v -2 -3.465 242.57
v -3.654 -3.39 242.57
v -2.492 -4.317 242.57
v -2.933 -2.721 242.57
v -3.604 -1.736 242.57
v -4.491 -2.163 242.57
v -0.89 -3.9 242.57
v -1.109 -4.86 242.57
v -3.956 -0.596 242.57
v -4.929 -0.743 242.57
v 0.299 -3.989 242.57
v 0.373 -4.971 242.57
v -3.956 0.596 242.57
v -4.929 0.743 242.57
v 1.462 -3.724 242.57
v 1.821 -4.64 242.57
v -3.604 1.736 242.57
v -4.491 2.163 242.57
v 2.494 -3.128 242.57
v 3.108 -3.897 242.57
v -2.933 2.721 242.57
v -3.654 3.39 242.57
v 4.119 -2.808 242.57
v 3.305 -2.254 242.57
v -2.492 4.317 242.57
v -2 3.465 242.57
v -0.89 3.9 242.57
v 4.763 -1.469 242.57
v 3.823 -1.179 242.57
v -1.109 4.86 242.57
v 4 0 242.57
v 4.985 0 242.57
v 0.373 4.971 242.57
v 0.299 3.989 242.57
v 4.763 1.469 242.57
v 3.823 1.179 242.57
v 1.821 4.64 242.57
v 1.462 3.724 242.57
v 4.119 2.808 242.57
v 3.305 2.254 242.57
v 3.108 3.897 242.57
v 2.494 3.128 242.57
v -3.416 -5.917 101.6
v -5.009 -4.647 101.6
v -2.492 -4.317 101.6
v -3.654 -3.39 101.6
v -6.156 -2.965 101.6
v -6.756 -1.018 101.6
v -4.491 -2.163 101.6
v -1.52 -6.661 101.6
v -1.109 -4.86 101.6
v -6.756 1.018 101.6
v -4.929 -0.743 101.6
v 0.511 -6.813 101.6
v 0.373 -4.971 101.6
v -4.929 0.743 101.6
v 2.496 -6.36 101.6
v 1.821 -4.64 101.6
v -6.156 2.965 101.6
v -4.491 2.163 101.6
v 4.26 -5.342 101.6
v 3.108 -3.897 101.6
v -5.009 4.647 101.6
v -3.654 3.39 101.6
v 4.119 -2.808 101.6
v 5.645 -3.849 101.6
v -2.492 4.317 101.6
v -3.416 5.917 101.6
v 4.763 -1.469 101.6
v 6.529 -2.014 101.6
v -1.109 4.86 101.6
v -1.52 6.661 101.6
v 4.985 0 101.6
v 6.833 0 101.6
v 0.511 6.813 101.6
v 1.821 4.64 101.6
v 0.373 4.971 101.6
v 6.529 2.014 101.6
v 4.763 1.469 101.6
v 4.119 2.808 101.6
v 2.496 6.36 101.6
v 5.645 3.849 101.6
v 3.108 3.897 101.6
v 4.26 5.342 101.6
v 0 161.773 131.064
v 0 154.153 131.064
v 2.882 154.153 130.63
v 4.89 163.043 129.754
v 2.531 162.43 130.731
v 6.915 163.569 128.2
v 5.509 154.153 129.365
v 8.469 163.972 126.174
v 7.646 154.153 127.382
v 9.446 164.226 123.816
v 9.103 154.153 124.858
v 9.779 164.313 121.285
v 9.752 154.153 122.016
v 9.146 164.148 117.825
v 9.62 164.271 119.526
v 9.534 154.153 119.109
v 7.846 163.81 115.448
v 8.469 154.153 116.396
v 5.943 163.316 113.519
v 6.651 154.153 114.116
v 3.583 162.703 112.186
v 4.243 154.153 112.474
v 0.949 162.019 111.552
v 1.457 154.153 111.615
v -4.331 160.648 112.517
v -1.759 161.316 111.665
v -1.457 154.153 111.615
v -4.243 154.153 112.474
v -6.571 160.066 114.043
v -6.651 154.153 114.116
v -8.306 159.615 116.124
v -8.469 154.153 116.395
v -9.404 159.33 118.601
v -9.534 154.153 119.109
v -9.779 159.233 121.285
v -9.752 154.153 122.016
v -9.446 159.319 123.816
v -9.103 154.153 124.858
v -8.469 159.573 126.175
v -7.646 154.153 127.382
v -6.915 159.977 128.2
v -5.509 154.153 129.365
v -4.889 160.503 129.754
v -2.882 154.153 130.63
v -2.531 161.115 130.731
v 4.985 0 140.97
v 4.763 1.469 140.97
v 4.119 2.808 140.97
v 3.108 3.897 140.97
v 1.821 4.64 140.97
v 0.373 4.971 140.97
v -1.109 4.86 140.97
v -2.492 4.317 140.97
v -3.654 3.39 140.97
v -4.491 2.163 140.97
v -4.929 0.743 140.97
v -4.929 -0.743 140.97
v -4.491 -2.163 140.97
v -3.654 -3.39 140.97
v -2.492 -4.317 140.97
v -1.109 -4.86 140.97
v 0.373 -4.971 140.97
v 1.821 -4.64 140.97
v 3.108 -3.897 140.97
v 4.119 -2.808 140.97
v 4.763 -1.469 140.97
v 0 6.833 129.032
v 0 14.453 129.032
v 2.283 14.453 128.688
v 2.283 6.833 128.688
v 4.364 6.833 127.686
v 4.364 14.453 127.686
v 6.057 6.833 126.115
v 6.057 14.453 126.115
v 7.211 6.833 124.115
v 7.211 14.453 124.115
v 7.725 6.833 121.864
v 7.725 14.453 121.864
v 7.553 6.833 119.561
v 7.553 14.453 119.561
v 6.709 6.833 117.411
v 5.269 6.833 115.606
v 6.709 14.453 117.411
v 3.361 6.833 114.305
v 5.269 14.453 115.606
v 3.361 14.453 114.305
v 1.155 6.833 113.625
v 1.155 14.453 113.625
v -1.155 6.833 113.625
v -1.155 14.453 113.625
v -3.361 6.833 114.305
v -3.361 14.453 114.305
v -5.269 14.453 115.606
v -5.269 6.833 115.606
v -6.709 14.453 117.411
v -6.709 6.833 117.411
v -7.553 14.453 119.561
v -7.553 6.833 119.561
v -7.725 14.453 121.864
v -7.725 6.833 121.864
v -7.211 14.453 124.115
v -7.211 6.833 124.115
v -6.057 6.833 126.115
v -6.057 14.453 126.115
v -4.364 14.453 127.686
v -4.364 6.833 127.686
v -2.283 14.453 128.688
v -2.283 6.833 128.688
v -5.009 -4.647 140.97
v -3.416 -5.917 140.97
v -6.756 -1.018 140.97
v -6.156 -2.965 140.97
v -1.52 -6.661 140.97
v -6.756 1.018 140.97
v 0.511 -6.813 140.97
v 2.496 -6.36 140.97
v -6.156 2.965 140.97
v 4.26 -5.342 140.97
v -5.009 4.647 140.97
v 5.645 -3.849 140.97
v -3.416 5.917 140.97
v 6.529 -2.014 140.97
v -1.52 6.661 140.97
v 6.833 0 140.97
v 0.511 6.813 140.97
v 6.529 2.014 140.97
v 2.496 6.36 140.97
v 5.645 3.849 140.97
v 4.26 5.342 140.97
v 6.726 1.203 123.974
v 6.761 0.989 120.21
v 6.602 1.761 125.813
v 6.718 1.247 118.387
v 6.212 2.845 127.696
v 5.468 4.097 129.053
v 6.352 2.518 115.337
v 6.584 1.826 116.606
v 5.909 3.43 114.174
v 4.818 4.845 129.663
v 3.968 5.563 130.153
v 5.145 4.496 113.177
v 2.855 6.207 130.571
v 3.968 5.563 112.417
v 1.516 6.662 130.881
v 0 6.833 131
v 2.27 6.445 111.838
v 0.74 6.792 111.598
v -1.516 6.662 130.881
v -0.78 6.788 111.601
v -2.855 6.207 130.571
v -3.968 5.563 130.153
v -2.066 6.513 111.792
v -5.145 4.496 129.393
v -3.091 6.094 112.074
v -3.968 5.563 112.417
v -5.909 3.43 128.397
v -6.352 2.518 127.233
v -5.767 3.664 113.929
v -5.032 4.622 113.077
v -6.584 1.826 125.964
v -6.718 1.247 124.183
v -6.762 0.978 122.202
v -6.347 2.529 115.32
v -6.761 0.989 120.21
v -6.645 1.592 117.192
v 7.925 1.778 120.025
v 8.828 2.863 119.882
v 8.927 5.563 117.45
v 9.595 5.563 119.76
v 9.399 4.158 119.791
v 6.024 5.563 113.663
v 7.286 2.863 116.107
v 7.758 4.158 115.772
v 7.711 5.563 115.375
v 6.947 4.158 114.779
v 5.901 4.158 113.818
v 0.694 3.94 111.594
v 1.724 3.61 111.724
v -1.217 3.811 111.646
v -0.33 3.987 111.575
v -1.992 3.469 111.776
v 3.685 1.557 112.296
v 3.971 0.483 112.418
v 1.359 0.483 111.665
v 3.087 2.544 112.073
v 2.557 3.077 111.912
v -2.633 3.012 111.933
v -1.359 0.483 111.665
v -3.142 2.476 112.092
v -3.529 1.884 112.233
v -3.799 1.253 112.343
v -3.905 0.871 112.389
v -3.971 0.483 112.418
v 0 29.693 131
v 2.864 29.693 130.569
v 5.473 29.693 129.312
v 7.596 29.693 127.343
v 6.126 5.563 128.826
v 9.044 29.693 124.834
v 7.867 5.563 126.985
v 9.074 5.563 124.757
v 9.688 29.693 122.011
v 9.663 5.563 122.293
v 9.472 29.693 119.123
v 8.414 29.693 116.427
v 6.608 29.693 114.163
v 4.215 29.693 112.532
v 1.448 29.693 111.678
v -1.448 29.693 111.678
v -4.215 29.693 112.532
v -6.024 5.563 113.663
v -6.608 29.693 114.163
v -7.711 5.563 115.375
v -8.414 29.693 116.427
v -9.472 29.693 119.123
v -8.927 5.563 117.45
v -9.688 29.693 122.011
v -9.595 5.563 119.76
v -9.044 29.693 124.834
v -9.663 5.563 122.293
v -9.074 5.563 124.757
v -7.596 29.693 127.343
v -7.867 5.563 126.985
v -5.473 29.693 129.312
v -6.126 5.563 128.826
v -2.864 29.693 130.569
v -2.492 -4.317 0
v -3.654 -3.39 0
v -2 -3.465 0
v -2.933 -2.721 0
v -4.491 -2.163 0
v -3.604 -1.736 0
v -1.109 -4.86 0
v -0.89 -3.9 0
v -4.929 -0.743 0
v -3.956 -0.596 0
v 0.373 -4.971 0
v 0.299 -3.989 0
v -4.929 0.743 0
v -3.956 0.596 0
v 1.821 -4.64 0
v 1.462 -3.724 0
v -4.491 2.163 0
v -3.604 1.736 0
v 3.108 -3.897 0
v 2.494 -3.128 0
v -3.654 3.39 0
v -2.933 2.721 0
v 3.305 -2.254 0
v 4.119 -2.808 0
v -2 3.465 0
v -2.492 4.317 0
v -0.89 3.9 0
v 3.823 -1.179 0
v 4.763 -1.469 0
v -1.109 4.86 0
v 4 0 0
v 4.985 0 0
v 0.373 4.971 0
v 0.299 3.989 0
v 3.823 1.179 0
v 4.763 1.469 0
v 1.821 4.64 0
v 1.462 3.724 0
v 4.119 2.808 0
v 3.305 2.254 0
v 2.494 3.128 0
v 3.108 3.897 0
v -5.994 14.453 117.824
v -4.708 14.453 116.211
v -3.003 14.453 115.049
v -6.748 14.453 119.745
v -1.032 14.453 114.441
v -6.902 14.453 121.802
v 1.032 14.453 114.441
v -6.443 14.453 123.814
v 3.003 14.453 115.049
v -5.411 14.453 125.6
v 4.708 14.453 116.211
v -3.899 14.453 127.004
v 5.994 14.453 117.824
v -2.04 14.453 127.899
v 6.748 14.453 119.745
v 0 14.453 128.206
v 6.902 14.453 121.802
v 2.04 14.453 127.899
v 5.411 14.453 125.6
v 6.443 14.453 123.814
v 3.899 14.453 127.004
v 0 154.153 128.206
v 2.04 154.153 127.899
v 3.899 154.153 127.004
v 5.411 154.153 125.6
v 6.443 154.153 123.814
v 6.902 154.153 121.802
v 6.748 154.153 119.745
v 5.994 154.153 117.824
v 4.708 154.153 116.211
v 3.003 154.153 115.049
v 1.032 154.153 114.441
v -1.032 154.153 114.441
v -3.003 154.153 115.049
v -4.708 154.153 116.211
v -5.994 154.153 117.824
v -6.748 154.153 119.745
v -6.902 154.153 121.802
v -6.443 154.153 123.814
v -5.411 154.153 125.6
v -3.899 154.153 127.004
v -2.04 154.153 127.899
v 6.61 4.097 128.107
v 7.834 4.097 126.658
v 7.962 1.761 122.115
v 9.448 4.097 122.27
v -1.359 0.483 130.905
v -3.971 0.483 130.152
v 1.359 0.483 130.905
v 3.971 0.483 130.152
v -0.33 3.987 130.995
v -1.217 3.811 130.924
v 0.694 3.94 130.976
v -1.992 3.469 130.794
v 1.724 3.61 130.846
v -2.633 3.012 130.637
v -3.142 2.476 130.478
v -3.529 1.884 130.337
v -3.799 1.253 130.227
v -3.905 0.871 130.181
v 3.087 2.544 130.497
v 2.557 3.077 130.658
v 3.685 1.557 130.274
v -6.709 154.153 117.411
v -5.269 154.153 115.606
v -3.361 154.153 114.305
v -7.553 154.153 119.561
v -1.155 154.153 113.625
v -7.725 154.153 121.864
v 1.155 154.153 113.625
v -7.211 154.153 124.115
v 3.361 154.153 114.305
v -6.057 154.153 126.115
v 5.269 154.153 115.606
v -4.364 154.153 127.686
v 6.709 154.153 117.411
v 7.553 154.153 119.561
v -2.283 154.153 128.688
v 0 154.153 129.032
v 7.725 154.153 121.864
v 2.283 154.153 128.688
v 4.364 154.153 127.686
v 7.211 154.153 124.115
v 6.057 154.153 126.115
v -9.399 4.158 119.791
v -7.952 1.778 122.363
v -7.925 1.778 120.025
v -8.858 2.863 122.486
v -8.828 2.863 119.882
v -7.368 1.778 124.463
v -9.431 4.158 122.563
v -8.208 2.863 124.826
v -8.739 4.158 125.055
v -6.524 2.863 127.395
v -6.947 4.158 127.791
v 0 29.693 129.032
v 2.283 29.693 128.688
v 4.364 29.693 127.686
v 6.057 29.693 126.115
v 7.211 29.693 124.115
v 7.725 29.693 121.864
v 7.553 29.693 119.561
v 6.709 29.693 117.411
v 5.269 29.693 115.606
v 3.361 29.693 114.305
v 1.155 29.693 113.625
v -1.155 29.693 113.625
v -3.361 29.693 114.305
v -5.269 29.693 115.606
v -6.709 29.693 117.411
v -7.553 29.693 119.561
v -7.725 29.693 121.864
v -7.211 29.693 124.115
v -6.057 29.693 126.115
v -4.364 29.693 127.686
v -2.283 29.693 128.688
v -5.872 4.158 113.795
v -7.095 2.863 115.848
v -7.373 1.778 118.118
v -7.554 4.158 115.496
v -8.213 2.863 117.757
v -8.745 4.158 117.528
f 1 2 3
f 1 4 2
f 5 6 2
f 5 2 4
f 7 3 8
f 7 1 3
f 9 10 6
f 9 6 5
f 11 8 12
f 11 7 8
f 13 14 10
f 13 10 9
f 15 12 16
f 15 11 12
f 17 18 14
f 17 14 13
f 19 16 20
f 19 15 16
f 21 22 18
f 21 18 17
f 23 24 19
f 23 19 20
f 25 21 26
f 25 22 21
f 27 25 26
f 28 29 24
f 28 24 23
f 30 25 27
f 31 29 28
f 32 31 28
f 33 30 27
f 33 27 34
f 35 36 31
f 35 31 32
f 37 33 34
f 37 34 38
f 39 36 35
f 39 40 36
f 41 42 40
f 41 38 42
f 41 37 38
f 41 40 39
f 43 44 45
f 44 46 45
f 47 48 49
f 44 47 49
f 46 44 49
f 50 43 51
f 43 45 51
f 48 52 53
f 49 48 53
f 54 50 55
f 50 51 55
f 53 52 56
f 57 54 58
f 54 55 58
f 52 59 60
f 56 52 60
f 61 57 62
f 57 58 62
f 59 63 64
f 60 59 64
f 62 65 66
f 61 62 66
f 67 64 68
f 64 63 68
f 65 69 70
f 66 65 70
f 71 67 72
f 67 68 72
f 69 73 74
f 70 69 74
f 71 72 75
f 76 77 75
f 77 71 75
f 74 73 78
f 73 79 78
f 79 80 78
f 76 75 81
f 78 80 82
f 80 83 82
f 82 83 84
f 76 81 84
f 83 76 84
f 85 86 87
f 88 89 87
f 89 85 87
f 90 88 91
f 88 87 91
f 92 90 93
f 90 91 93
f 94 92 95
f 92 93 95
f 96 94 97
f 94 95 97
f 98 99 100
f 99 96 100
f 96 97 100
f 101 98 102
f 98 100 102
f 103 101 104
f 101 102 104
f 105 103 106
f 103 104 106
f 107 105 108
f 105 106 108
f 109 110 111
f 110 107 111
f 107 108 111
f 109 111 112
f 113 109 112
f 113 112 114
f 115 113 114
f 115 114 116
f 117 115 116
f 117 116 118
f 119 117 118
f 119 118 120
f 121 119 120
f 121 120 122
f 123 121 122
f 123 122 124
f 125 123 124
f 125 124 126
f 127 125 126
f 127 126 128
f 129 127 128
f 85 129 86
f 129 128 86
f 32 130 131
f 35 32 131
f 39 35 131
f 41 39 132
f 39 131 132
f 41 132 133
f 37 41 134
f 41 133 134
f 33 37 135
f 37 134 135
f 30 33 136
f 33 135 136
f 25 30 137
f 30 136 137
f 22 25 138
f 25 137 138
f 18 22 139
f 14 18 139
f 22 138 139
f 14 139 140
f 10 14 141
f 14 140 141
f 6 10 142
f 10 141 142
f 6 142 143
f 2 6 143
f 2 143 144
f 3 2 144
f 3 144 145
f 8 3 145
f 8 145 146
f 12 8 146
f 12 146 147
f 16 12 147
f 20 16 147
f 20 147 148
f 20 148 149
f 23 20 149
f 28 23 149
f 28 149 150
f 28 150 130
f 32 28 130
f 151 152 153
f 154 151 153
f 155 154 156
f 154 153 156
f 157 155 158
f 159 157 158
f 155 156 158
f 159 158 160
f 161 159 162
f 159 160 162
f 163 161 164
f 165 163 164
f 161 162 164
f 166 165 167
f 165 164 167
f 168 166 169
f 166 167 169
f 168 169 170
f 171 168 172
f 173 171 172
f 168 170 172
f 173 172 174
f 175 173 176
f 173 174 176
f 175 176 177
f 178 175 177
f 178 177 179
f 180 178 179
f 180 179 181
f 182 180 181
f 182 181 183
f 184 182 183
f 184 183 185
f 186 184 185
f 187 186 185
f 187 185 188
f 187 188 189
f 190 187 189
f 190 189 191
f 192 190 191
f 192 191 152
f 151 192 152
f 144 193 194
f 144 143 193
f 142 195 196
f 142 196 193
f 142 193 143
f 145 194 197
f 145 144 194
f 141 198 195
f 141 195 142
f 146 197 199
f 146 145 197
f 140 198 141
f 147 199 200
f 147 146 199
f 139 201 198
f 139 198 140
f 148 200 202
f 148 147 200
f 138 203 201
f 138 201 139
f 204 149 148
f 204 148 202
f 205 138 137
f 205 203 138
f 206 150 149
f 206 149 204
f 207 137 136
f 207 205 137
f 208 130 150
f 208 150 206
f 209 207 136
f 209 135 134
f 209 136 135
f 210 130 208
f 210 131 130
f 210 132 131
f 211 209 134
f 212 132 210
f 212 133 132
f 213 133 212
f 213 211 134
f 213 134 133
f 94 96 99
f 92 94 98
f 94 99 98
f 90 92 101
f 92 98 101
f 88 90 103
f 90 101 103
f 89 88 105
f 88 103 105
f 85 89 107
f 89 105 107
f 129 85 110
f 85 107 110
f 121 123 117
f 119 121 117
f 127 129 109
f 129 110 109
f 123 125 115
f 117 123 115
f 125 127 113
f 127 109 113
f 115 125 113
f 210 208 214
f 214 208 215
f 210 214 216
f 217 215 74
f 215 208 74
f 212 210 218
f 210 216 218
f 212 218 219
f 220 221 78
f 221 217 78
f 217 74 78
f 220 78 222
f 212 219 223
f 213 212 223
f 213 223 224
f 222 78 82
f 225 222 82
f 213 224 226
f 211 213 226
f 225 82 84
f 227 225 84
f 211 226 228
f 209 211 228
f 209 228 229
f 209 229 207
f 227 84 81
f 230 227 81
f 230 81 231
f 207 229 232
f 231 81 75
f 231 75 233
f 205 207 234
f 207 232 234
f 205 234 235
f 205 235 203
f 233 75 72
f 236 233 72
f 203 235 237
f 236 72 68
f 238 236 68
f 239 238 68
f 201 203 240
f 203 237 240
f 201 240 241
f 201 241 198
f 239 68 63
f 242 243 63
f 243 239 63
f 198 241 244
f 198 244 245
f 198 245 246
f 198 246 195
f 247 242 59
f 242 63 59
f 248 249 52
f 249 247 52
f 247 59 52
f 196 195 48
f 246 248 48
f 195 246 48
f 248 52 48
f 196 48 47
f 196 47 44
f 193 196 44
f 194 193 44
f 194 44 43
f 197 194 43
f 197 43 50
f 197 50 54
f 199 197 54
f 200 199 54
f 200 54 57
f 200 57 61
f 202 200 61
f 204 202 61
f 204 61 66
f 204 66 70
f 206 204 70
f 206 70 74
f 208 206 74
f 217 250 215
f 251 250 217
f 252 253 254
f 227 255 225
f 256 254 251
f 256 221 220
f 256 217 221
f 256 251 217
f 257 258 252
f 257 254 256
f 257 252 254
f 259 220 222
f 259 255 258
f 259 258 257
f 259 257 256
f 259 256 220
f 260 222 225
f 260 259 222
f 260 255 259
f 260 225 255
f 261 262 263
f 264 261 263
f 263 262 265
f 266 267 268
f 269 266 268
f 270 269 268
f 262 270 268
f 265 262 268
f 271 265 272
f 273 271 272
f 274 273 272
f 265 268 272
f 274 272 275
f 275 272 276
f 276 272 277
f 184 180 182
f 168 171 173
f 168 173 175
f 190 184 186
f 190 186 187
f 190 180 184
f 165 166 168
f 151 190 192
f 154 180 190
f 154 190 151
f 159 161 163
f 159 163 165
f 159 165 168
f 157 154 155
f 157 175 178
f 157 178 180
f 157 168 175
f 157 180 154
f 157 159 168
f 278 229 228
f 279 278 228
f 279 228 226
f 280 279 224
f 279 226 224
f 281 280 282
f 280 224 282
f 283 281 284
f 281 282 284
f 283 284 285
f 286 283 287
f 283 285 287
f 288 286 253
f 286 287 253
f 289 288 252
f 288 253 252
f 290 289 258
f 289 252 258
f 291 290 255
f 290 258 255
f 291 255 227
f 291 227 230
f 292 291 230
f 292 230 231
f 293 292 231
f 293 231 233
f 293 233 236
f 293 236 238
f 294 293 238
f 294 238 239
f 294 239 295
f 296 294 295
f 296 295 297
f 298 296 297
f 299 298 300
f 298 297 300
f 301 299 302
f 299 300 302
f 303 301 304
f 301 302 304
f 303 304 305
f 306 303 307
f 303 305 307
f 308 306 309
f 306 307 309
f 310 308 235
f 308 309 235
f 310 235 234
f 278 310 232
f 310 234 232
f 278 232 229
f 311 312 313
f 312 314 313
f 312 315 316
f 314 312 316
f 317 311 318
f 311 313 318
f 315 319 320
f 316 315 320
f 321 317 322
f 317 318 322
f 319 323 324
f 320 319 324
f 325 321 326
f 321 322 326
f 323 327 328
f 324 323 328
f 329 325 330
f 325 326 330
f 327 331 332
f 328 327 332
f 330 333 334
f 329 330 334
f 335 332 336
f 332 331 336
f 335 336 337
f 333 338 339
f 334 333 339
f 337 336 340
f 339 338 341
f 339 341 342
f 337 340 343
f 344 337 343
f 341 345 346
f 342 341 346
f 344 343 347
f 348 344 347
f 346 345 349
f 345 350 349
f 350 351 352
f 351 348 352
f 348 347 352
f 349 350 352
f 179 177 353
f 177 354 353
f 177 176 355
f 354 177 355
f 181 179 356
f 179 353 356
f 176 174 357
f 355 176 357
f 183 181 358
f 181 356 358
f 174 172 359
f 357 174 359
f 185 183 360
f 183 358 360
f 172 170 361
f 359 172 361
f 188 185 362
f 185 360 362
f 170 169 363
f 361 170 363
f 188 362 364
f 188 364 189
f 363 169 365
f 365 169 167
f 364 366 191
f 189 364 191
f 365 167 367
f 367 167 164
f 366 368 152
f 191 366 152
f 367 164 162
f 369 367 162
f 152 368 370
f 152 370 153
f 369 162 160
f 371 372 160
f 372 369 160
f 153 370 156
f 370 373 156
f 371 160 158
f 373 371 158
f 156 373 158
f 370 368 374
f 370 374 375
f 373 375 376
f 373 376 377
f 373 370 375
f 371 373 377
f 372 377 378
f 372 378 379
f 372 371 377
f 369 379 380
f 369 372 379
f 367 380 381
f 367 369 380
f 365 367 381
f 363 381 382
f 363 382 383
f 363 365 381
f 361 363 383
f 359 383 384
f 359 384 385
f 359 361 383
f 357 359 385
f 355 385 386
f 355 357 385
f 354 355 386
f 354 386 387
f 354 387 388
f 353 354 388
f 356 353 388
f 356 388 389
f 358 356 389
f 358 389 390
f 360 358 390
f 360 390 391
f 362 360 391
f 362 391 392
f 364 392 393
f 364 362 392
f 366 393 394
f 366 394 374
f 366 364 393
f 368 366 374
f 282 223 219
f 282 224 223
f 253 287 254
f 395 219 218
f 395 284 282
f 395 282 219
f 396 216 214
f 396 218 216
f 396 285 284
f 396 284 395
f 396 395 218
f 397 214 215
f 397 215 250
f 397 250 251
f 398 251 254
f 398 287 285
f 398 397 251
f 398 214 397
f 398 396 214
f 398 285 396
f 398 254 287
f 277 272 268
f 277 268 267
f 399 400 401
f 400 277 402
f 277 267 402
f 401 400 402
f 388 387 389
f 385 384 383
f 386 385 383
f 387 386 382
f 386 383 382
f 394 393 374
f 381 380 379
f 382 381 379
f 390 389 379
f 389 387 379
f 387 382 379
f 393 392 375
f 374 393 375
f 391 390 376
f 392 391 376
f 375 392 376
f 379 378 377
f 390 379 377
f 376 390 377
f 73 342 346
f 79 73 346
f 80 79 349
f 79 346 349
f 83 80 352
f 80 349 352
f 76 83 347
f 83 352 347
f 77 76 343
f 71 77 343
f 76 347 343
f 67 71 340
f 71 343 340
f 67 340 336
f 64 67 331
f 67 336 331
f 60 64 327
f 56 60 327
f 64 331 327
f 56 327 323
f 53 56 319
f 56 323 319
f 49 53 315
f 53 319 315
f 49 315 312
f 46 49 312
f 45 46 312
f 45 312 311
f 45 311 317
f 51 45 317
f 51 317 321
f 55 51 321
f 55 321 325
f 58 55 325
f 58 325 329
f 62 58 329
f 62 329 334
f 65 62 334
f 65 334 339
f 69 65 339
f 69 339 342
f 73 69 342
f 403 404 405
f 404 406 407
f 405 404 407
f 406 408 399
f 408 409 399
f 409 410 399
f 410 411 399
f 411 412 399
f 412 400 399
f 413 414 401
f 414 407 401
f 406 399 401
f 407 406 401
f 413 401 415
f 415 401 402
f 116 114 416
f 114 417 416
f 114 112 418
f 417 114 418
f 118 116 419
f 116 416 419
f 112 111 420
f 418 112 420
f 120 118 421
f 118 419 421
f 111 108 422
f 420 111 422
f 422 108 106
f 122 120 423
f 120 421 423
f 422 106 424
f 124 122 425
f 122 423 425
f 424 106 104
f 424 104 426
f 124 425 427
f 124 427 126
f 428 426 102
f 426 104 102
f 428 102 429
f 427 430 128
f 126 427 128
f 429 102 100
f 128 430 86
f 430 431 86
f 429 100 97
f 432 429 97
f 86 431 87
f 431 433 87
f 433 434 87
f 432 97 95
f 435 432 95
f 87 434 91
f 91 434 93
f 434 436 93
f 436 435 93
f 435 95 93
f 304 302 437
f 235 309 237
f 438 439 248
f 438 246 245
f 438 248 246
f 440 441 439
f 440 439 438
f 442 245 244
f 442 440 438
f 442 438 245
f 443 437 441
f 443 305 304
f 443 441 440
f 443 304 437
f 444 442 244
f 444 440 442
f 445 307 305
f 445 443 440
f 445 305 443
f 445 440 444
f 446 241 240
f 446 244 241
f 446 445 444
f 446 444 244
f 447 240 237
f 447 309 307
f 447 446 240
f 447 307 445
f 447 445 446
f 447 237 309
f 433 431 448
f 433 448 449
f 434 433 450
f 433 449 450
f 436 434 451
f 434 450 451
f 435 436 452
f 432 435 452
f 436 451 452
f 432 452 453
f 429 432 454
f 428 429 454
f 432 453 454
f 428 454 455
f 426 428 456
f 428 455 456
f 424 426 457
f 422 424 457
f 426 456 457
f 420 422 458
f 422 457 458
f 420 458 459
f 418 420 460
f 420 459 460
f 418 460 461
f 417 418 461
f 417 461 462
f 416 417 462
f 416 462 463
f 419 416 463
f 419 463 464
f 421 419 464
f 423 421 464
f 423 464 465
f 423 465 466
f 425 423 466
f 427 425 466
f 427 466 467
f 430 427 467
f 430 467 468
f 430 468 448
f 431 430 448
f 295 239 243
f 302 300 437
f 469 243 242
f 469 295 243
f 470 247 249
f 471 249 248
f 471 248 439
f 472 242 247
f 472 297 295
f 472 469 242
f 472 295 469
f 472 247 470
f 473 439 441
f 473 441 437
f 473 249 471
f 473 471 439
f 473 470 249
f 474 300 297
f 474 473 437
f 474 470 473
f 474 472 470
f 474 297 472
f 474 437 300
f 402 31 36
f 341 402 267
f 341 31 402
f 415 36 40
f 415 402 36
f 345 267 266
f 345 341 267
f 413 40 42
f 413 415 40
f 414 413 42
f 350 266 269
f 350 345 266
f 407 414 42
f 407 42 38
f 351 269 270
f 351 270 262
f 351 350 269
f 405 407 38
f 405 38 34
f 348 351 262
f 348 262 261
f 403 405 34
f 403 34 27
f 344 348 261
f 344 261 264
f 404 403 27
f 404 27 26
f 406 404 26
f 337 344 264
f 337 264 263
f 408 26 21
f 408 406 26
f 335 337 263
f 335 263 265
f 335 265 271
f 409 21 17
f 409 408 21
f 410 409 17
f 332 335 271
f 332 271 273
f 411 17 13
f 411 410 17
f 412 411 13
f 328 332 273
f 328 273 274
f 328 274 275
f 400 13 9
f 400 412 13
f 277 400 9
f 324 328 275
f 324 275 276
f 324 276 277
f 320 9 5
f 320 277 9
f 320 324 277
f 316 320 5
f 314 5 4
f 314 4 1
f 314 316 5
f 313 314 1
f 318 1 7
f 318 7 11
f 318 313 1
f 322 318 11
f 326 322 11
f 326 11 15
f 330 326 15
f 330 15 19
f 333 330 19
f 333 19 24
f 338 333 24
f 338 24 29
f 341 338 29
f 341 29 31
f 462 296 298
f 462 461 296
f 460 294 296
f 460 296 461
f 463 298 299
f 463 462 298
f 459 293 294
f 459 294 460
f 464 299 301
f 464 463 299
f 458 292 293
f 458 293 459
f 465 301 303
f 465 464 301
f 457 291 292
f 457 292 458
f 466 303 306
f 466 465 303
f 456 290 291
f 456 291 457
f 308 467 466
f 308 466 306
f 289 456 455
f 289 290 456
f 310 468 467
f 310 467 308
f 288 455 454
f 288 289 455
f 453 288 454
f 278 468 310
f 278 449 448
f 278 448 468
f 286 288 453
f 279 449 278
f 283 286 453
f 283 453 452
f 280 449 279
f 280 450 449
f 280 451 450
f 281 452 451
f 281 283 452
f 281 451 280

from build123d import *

# Parameters (mm, degrees)
SKETCH1_R                = 4.98475
SKETCH1_R_2              = 4.0005
BOSS_EXTRUDE1_DEPTH      = 242.57
BOSS_EXTRUDE2_START      = -39.37
SKETCH2_R                = 6.8326
SKETCH2_R_2              = 4.98475
BOSS_EXTRUDE2_DEPTH      = 39.37
BOSS_EXTRUDE3_DEPTH      = 22.86
BOSS_EXTRUDE3_DEPTH_BACK = 6.35
SKETCH4_R                = 9.7155
SKETCH5_R                = 7.747
CUT_EXTRUDE1_DEPTH       = 22.86
FILLET1_R                = 5.08
BOSS_EXTRUDE5_DEPTH      = 124.46
BOSS_EXTRUDE5_DEPTH_BACK = 15.24
SKETCH6_R                = 7.747
SKETCH6_R_2              = 6.9215
SKETCH7_R                = 9.779
BOSS_EXTRUDE6_DEPTH      = 10.16
CUT_EXTRUDE2_DEPTH       = 217.718250934


with BuildPart() as part:
    # Sketch1 → Boss-Extrude1 (new body)
    with BuildSketch(Plane.XY):
        Circle(SKETCH1_R)
        Circle(SKETCH1_R_2, mode=Mode.SUBTRACT)
    extrude(amount=BOSS_EXTRUDE1_DEPTH)

    # Sketch2 → Boss-Extrude2 (add)
    with BuildSketch(Plane.XY.offset(140.97).offset(BOSS_EXTRUDE2_START)):
        Circle(SKETCH2_R)
        Circle(SKETCH2_R_2, mode=Mode.SUBTRACT)
    extrude(amount=BOSS_EXTRUDE2_DEPTH)

    # Sketch4 → Boss-Extrude3 (add, two sides: drawn at the far end of the back side and taken through both)
    with BuildSketch(Plane(origin=(0, 6.8326, 0), x_dir=(1, 0, 0), z_dir=(0, 1, 0)).offset(-BOSS_EXTRUDE3_DEPTH_BACK)):
        with Locations(Location((0, -121.285, 0), (0, 0, 270))):
            Circle(SKETCH4_R)
    extrude(amount=BOSS_EXTRUDE3_DEPTH + BOSS_EXTRUDE3_DEPTH_BACK)

    # Sketch5 → Cut-Extrude1 (cut)
    with BuildSketch(Plane(origin=(0, 29.6926, 0), x_dir=(1, 0, 0), z_dir=(0, 1, 0))):
        with Locations(Location((0, -121.285, 0), (0, 0, 270))):
            Circle(SKETCH5_R)
    extrude(amount=-CUT_EXTRUDE1_DEPTH, mode=Mode.SUBTRACT)

    # Fillet1
    # the kernel refuses this fillet: 5.08 mm, written as the material it adds along each edge
    # the kernel refuses this fillet: 5.08 mm, written as the material it takes off along each edge
    with BuildSketch(Plane(origin=(0, 0.4826, 121.285), x_dir=(-0.9876010870599544, 0, -0.1569843713176455), z_dir=(0.1569843713176455, 0, -0.9876010870599544))) as fillet1_2_piece_1_section:
        with BuildLine():
            CenterArc((9.7155 - FILLET1_R, FILLET1_R), FILLET1_R, 270, 90)
            Line((9.7155 - FILLET1_R, 0), (9.7155, 0))
            Line((9.7155, 0), (9.7155, FILLET1_R))
        make_face()
    fillet1_2_piece_1 = revolve(axis=Axis((0, 0.4826, 121.285), (0, 1, 0)), revolution_arc=198.063802919, mode=Mode.PRIVATE)
    fillet1_2_piece_1 = fillet1_2_piece_1 - Plane(origin=(0, 0, 123.780869726), x_dir=(1, 0, 0), z_dir=(0, 0, -1)) * Cylinder(6.8326, 39, mode=Mode.PRIVATE)
    add(fillet1_2_piece_1, mode=Mode.SUBTRACT)
    with BuildSketch(Plane(origin=(0, 0.4826, 121.285), x_dir=(0.9876010870599545, 0, 0.15698437131764403), z_dir=(-0.15698437131764403, 0, 0.9876010870599545))) as fillet1_2_piece_2_section:
        with BuildLine():
            CenterArc((9.7155 - FILLET1_R, FILLET1_R), FILLET1_R, 270, 90)
            Line((9.7155, FILLET1_R), (9.7155, 0))
            Line((9.7155, 0), (9.7155 - FILLET1_R, 0))
        make_face()
    fillet1_2_piece_2 = revolve(axis=Axis((0, 0.4826, 121.285), (0, 1, 0)), revolution_arc=198.063802919, mode=Mode.PRIVATE)
    fillet1_2_piece_2 = fillet1_2_piece_2 - Plane(origin=(0, 0, 118.789130045), x_dir=(1, 0, 0), z_dir=(0, 0, -1)) * Cylinder(6.8326, 39, mode=Mode.PRIVATE)
    add(fillet1_2_piece_2, mode=Mode.SUBTRACT)
    with BuildSketch(Plane(origin=(0, 0.4826, 121.285), x_dir=(-0.505713651379917, 0, 0.8627013984038694), z_dir=(-0.8627013984038694, 0, -0.505713651379917))) as fillet1_2_piece_3_section:
        with BuildLine():
            CenterArc((9.7155 - FILLET1_R, FILLET1_R), FILLET1_R, 270, 90)
            Line((9.7155 - FILLET1_R, 0), (9.7155, 0))
            Line((9.7155, 0), (9.7155, FILLET1_R))
        make_face()
    fillet1_2_piece_3 = revolve(axis=Axis((0, 0.4826, 121.285), (0, 1, 0)), revolution_arc=240.757475194, mode=Mode.PRIVATE)
    fillet1_2_piece_3 = fillet1_2_piece_3 - Plane(origin=(0, 0, 129.754845305), x_dir=(1, 0, 0), z_dir=(0, 0, -1)) * Cylinder(6.8326, 39, mode=Mode.PRIVATE)
    add(fillet1_2_piece_3, mode=Mode.SUBTRACT)
    with BuildSketch(Plane(origin=(0, 0.4826, 121.285), x_dir=(0.5057136513799171, 0, -0.8627013984038694), z_dir=(0.8627013984038694, 0, 0.5057136513799171))) as fillet1_2_piece_4_section:
        with BuildLine():
            CenterArc((9.7155 - FILLET1_R, FILLET1_R), FILLET1_R, 270, 90)
            Line((9.7155 - FILLET1_R, 0), (9.7155, 0))
            Line((9.7155, 0), (9.7155, FILLET1_R))
        make_face()
    fillet1_2_piece_4 = revolve(axis=Axis((0, 0.4826, 121.285), (0, 1, 0)), revolution_arc=240.757475194, mode=Mode.PRIVATE)
    fillet1_2_piece_4 = fillet1_2_piece_4 - Plane(origin=(0, 0, 112.815156077), x_dir=(1, 0, 0), z_dir=(0, 0, -1)) * Cylinder(6.8326, 39, mode=Mode.PRIVATE)
    add(fillet1_2_piece_4, mode=Mode.SUBTRACT)

    # Sketch6 → Boss-Extrude5 (add, two sides: drawn at the far end of the back side and taken through both)
    with BuildSketch(Plane(origin=(0, 29.6926, 0), x_dir=(1, 0, 0), z_dir=(0, 1, 0)).offset(-BOSS_EXTRUDE5_DEPTH_BACK)):
        with Locations(Location((0, -121.285, 0), (0, 0, 270))):
            Circle(SKETCH6_R)
        with Locations(Location((0, -121.285, 0), (0, 0, 270))):
            Circle(SKETCH6_R_2, mode=Mode.SUBTRACT)
    extrude(amount=BOSS_EXTRUDE5_DEPTH + BOSS_EXTRUDE5_DEPTH_BACK)

    # Sketch7 → Boss-Extrude6 (add)
    with BuildSketch(Plane(origin=(0, 154.1526, 0), x_dir=(1, 0, 0), z_dir=(0, 1, 0))):
        with Locations(Location((0, -121.285, 0), (0, 0, 270))):
            Circle(SKETCH7_R)
    extrude(amount=BOSS_EXTRUDE6_DEPTH)

    # Sketch8 → Cut-Extrude2 (cut, through all)
    with BuildSketch(Plane(origin=(0, 0, 101.6), x_dir=(-1, 0, 0), z_dir=(0, 0, -1))):
        Polygon((9.779, 164.3126), (-9.779, 164.3126), (9.779, 159.2326), align=None)
    extrude(amount=-CUT_EXTRUDE2_DEPTH, mode=Mode.SUBTRACT)


solid = part.part
